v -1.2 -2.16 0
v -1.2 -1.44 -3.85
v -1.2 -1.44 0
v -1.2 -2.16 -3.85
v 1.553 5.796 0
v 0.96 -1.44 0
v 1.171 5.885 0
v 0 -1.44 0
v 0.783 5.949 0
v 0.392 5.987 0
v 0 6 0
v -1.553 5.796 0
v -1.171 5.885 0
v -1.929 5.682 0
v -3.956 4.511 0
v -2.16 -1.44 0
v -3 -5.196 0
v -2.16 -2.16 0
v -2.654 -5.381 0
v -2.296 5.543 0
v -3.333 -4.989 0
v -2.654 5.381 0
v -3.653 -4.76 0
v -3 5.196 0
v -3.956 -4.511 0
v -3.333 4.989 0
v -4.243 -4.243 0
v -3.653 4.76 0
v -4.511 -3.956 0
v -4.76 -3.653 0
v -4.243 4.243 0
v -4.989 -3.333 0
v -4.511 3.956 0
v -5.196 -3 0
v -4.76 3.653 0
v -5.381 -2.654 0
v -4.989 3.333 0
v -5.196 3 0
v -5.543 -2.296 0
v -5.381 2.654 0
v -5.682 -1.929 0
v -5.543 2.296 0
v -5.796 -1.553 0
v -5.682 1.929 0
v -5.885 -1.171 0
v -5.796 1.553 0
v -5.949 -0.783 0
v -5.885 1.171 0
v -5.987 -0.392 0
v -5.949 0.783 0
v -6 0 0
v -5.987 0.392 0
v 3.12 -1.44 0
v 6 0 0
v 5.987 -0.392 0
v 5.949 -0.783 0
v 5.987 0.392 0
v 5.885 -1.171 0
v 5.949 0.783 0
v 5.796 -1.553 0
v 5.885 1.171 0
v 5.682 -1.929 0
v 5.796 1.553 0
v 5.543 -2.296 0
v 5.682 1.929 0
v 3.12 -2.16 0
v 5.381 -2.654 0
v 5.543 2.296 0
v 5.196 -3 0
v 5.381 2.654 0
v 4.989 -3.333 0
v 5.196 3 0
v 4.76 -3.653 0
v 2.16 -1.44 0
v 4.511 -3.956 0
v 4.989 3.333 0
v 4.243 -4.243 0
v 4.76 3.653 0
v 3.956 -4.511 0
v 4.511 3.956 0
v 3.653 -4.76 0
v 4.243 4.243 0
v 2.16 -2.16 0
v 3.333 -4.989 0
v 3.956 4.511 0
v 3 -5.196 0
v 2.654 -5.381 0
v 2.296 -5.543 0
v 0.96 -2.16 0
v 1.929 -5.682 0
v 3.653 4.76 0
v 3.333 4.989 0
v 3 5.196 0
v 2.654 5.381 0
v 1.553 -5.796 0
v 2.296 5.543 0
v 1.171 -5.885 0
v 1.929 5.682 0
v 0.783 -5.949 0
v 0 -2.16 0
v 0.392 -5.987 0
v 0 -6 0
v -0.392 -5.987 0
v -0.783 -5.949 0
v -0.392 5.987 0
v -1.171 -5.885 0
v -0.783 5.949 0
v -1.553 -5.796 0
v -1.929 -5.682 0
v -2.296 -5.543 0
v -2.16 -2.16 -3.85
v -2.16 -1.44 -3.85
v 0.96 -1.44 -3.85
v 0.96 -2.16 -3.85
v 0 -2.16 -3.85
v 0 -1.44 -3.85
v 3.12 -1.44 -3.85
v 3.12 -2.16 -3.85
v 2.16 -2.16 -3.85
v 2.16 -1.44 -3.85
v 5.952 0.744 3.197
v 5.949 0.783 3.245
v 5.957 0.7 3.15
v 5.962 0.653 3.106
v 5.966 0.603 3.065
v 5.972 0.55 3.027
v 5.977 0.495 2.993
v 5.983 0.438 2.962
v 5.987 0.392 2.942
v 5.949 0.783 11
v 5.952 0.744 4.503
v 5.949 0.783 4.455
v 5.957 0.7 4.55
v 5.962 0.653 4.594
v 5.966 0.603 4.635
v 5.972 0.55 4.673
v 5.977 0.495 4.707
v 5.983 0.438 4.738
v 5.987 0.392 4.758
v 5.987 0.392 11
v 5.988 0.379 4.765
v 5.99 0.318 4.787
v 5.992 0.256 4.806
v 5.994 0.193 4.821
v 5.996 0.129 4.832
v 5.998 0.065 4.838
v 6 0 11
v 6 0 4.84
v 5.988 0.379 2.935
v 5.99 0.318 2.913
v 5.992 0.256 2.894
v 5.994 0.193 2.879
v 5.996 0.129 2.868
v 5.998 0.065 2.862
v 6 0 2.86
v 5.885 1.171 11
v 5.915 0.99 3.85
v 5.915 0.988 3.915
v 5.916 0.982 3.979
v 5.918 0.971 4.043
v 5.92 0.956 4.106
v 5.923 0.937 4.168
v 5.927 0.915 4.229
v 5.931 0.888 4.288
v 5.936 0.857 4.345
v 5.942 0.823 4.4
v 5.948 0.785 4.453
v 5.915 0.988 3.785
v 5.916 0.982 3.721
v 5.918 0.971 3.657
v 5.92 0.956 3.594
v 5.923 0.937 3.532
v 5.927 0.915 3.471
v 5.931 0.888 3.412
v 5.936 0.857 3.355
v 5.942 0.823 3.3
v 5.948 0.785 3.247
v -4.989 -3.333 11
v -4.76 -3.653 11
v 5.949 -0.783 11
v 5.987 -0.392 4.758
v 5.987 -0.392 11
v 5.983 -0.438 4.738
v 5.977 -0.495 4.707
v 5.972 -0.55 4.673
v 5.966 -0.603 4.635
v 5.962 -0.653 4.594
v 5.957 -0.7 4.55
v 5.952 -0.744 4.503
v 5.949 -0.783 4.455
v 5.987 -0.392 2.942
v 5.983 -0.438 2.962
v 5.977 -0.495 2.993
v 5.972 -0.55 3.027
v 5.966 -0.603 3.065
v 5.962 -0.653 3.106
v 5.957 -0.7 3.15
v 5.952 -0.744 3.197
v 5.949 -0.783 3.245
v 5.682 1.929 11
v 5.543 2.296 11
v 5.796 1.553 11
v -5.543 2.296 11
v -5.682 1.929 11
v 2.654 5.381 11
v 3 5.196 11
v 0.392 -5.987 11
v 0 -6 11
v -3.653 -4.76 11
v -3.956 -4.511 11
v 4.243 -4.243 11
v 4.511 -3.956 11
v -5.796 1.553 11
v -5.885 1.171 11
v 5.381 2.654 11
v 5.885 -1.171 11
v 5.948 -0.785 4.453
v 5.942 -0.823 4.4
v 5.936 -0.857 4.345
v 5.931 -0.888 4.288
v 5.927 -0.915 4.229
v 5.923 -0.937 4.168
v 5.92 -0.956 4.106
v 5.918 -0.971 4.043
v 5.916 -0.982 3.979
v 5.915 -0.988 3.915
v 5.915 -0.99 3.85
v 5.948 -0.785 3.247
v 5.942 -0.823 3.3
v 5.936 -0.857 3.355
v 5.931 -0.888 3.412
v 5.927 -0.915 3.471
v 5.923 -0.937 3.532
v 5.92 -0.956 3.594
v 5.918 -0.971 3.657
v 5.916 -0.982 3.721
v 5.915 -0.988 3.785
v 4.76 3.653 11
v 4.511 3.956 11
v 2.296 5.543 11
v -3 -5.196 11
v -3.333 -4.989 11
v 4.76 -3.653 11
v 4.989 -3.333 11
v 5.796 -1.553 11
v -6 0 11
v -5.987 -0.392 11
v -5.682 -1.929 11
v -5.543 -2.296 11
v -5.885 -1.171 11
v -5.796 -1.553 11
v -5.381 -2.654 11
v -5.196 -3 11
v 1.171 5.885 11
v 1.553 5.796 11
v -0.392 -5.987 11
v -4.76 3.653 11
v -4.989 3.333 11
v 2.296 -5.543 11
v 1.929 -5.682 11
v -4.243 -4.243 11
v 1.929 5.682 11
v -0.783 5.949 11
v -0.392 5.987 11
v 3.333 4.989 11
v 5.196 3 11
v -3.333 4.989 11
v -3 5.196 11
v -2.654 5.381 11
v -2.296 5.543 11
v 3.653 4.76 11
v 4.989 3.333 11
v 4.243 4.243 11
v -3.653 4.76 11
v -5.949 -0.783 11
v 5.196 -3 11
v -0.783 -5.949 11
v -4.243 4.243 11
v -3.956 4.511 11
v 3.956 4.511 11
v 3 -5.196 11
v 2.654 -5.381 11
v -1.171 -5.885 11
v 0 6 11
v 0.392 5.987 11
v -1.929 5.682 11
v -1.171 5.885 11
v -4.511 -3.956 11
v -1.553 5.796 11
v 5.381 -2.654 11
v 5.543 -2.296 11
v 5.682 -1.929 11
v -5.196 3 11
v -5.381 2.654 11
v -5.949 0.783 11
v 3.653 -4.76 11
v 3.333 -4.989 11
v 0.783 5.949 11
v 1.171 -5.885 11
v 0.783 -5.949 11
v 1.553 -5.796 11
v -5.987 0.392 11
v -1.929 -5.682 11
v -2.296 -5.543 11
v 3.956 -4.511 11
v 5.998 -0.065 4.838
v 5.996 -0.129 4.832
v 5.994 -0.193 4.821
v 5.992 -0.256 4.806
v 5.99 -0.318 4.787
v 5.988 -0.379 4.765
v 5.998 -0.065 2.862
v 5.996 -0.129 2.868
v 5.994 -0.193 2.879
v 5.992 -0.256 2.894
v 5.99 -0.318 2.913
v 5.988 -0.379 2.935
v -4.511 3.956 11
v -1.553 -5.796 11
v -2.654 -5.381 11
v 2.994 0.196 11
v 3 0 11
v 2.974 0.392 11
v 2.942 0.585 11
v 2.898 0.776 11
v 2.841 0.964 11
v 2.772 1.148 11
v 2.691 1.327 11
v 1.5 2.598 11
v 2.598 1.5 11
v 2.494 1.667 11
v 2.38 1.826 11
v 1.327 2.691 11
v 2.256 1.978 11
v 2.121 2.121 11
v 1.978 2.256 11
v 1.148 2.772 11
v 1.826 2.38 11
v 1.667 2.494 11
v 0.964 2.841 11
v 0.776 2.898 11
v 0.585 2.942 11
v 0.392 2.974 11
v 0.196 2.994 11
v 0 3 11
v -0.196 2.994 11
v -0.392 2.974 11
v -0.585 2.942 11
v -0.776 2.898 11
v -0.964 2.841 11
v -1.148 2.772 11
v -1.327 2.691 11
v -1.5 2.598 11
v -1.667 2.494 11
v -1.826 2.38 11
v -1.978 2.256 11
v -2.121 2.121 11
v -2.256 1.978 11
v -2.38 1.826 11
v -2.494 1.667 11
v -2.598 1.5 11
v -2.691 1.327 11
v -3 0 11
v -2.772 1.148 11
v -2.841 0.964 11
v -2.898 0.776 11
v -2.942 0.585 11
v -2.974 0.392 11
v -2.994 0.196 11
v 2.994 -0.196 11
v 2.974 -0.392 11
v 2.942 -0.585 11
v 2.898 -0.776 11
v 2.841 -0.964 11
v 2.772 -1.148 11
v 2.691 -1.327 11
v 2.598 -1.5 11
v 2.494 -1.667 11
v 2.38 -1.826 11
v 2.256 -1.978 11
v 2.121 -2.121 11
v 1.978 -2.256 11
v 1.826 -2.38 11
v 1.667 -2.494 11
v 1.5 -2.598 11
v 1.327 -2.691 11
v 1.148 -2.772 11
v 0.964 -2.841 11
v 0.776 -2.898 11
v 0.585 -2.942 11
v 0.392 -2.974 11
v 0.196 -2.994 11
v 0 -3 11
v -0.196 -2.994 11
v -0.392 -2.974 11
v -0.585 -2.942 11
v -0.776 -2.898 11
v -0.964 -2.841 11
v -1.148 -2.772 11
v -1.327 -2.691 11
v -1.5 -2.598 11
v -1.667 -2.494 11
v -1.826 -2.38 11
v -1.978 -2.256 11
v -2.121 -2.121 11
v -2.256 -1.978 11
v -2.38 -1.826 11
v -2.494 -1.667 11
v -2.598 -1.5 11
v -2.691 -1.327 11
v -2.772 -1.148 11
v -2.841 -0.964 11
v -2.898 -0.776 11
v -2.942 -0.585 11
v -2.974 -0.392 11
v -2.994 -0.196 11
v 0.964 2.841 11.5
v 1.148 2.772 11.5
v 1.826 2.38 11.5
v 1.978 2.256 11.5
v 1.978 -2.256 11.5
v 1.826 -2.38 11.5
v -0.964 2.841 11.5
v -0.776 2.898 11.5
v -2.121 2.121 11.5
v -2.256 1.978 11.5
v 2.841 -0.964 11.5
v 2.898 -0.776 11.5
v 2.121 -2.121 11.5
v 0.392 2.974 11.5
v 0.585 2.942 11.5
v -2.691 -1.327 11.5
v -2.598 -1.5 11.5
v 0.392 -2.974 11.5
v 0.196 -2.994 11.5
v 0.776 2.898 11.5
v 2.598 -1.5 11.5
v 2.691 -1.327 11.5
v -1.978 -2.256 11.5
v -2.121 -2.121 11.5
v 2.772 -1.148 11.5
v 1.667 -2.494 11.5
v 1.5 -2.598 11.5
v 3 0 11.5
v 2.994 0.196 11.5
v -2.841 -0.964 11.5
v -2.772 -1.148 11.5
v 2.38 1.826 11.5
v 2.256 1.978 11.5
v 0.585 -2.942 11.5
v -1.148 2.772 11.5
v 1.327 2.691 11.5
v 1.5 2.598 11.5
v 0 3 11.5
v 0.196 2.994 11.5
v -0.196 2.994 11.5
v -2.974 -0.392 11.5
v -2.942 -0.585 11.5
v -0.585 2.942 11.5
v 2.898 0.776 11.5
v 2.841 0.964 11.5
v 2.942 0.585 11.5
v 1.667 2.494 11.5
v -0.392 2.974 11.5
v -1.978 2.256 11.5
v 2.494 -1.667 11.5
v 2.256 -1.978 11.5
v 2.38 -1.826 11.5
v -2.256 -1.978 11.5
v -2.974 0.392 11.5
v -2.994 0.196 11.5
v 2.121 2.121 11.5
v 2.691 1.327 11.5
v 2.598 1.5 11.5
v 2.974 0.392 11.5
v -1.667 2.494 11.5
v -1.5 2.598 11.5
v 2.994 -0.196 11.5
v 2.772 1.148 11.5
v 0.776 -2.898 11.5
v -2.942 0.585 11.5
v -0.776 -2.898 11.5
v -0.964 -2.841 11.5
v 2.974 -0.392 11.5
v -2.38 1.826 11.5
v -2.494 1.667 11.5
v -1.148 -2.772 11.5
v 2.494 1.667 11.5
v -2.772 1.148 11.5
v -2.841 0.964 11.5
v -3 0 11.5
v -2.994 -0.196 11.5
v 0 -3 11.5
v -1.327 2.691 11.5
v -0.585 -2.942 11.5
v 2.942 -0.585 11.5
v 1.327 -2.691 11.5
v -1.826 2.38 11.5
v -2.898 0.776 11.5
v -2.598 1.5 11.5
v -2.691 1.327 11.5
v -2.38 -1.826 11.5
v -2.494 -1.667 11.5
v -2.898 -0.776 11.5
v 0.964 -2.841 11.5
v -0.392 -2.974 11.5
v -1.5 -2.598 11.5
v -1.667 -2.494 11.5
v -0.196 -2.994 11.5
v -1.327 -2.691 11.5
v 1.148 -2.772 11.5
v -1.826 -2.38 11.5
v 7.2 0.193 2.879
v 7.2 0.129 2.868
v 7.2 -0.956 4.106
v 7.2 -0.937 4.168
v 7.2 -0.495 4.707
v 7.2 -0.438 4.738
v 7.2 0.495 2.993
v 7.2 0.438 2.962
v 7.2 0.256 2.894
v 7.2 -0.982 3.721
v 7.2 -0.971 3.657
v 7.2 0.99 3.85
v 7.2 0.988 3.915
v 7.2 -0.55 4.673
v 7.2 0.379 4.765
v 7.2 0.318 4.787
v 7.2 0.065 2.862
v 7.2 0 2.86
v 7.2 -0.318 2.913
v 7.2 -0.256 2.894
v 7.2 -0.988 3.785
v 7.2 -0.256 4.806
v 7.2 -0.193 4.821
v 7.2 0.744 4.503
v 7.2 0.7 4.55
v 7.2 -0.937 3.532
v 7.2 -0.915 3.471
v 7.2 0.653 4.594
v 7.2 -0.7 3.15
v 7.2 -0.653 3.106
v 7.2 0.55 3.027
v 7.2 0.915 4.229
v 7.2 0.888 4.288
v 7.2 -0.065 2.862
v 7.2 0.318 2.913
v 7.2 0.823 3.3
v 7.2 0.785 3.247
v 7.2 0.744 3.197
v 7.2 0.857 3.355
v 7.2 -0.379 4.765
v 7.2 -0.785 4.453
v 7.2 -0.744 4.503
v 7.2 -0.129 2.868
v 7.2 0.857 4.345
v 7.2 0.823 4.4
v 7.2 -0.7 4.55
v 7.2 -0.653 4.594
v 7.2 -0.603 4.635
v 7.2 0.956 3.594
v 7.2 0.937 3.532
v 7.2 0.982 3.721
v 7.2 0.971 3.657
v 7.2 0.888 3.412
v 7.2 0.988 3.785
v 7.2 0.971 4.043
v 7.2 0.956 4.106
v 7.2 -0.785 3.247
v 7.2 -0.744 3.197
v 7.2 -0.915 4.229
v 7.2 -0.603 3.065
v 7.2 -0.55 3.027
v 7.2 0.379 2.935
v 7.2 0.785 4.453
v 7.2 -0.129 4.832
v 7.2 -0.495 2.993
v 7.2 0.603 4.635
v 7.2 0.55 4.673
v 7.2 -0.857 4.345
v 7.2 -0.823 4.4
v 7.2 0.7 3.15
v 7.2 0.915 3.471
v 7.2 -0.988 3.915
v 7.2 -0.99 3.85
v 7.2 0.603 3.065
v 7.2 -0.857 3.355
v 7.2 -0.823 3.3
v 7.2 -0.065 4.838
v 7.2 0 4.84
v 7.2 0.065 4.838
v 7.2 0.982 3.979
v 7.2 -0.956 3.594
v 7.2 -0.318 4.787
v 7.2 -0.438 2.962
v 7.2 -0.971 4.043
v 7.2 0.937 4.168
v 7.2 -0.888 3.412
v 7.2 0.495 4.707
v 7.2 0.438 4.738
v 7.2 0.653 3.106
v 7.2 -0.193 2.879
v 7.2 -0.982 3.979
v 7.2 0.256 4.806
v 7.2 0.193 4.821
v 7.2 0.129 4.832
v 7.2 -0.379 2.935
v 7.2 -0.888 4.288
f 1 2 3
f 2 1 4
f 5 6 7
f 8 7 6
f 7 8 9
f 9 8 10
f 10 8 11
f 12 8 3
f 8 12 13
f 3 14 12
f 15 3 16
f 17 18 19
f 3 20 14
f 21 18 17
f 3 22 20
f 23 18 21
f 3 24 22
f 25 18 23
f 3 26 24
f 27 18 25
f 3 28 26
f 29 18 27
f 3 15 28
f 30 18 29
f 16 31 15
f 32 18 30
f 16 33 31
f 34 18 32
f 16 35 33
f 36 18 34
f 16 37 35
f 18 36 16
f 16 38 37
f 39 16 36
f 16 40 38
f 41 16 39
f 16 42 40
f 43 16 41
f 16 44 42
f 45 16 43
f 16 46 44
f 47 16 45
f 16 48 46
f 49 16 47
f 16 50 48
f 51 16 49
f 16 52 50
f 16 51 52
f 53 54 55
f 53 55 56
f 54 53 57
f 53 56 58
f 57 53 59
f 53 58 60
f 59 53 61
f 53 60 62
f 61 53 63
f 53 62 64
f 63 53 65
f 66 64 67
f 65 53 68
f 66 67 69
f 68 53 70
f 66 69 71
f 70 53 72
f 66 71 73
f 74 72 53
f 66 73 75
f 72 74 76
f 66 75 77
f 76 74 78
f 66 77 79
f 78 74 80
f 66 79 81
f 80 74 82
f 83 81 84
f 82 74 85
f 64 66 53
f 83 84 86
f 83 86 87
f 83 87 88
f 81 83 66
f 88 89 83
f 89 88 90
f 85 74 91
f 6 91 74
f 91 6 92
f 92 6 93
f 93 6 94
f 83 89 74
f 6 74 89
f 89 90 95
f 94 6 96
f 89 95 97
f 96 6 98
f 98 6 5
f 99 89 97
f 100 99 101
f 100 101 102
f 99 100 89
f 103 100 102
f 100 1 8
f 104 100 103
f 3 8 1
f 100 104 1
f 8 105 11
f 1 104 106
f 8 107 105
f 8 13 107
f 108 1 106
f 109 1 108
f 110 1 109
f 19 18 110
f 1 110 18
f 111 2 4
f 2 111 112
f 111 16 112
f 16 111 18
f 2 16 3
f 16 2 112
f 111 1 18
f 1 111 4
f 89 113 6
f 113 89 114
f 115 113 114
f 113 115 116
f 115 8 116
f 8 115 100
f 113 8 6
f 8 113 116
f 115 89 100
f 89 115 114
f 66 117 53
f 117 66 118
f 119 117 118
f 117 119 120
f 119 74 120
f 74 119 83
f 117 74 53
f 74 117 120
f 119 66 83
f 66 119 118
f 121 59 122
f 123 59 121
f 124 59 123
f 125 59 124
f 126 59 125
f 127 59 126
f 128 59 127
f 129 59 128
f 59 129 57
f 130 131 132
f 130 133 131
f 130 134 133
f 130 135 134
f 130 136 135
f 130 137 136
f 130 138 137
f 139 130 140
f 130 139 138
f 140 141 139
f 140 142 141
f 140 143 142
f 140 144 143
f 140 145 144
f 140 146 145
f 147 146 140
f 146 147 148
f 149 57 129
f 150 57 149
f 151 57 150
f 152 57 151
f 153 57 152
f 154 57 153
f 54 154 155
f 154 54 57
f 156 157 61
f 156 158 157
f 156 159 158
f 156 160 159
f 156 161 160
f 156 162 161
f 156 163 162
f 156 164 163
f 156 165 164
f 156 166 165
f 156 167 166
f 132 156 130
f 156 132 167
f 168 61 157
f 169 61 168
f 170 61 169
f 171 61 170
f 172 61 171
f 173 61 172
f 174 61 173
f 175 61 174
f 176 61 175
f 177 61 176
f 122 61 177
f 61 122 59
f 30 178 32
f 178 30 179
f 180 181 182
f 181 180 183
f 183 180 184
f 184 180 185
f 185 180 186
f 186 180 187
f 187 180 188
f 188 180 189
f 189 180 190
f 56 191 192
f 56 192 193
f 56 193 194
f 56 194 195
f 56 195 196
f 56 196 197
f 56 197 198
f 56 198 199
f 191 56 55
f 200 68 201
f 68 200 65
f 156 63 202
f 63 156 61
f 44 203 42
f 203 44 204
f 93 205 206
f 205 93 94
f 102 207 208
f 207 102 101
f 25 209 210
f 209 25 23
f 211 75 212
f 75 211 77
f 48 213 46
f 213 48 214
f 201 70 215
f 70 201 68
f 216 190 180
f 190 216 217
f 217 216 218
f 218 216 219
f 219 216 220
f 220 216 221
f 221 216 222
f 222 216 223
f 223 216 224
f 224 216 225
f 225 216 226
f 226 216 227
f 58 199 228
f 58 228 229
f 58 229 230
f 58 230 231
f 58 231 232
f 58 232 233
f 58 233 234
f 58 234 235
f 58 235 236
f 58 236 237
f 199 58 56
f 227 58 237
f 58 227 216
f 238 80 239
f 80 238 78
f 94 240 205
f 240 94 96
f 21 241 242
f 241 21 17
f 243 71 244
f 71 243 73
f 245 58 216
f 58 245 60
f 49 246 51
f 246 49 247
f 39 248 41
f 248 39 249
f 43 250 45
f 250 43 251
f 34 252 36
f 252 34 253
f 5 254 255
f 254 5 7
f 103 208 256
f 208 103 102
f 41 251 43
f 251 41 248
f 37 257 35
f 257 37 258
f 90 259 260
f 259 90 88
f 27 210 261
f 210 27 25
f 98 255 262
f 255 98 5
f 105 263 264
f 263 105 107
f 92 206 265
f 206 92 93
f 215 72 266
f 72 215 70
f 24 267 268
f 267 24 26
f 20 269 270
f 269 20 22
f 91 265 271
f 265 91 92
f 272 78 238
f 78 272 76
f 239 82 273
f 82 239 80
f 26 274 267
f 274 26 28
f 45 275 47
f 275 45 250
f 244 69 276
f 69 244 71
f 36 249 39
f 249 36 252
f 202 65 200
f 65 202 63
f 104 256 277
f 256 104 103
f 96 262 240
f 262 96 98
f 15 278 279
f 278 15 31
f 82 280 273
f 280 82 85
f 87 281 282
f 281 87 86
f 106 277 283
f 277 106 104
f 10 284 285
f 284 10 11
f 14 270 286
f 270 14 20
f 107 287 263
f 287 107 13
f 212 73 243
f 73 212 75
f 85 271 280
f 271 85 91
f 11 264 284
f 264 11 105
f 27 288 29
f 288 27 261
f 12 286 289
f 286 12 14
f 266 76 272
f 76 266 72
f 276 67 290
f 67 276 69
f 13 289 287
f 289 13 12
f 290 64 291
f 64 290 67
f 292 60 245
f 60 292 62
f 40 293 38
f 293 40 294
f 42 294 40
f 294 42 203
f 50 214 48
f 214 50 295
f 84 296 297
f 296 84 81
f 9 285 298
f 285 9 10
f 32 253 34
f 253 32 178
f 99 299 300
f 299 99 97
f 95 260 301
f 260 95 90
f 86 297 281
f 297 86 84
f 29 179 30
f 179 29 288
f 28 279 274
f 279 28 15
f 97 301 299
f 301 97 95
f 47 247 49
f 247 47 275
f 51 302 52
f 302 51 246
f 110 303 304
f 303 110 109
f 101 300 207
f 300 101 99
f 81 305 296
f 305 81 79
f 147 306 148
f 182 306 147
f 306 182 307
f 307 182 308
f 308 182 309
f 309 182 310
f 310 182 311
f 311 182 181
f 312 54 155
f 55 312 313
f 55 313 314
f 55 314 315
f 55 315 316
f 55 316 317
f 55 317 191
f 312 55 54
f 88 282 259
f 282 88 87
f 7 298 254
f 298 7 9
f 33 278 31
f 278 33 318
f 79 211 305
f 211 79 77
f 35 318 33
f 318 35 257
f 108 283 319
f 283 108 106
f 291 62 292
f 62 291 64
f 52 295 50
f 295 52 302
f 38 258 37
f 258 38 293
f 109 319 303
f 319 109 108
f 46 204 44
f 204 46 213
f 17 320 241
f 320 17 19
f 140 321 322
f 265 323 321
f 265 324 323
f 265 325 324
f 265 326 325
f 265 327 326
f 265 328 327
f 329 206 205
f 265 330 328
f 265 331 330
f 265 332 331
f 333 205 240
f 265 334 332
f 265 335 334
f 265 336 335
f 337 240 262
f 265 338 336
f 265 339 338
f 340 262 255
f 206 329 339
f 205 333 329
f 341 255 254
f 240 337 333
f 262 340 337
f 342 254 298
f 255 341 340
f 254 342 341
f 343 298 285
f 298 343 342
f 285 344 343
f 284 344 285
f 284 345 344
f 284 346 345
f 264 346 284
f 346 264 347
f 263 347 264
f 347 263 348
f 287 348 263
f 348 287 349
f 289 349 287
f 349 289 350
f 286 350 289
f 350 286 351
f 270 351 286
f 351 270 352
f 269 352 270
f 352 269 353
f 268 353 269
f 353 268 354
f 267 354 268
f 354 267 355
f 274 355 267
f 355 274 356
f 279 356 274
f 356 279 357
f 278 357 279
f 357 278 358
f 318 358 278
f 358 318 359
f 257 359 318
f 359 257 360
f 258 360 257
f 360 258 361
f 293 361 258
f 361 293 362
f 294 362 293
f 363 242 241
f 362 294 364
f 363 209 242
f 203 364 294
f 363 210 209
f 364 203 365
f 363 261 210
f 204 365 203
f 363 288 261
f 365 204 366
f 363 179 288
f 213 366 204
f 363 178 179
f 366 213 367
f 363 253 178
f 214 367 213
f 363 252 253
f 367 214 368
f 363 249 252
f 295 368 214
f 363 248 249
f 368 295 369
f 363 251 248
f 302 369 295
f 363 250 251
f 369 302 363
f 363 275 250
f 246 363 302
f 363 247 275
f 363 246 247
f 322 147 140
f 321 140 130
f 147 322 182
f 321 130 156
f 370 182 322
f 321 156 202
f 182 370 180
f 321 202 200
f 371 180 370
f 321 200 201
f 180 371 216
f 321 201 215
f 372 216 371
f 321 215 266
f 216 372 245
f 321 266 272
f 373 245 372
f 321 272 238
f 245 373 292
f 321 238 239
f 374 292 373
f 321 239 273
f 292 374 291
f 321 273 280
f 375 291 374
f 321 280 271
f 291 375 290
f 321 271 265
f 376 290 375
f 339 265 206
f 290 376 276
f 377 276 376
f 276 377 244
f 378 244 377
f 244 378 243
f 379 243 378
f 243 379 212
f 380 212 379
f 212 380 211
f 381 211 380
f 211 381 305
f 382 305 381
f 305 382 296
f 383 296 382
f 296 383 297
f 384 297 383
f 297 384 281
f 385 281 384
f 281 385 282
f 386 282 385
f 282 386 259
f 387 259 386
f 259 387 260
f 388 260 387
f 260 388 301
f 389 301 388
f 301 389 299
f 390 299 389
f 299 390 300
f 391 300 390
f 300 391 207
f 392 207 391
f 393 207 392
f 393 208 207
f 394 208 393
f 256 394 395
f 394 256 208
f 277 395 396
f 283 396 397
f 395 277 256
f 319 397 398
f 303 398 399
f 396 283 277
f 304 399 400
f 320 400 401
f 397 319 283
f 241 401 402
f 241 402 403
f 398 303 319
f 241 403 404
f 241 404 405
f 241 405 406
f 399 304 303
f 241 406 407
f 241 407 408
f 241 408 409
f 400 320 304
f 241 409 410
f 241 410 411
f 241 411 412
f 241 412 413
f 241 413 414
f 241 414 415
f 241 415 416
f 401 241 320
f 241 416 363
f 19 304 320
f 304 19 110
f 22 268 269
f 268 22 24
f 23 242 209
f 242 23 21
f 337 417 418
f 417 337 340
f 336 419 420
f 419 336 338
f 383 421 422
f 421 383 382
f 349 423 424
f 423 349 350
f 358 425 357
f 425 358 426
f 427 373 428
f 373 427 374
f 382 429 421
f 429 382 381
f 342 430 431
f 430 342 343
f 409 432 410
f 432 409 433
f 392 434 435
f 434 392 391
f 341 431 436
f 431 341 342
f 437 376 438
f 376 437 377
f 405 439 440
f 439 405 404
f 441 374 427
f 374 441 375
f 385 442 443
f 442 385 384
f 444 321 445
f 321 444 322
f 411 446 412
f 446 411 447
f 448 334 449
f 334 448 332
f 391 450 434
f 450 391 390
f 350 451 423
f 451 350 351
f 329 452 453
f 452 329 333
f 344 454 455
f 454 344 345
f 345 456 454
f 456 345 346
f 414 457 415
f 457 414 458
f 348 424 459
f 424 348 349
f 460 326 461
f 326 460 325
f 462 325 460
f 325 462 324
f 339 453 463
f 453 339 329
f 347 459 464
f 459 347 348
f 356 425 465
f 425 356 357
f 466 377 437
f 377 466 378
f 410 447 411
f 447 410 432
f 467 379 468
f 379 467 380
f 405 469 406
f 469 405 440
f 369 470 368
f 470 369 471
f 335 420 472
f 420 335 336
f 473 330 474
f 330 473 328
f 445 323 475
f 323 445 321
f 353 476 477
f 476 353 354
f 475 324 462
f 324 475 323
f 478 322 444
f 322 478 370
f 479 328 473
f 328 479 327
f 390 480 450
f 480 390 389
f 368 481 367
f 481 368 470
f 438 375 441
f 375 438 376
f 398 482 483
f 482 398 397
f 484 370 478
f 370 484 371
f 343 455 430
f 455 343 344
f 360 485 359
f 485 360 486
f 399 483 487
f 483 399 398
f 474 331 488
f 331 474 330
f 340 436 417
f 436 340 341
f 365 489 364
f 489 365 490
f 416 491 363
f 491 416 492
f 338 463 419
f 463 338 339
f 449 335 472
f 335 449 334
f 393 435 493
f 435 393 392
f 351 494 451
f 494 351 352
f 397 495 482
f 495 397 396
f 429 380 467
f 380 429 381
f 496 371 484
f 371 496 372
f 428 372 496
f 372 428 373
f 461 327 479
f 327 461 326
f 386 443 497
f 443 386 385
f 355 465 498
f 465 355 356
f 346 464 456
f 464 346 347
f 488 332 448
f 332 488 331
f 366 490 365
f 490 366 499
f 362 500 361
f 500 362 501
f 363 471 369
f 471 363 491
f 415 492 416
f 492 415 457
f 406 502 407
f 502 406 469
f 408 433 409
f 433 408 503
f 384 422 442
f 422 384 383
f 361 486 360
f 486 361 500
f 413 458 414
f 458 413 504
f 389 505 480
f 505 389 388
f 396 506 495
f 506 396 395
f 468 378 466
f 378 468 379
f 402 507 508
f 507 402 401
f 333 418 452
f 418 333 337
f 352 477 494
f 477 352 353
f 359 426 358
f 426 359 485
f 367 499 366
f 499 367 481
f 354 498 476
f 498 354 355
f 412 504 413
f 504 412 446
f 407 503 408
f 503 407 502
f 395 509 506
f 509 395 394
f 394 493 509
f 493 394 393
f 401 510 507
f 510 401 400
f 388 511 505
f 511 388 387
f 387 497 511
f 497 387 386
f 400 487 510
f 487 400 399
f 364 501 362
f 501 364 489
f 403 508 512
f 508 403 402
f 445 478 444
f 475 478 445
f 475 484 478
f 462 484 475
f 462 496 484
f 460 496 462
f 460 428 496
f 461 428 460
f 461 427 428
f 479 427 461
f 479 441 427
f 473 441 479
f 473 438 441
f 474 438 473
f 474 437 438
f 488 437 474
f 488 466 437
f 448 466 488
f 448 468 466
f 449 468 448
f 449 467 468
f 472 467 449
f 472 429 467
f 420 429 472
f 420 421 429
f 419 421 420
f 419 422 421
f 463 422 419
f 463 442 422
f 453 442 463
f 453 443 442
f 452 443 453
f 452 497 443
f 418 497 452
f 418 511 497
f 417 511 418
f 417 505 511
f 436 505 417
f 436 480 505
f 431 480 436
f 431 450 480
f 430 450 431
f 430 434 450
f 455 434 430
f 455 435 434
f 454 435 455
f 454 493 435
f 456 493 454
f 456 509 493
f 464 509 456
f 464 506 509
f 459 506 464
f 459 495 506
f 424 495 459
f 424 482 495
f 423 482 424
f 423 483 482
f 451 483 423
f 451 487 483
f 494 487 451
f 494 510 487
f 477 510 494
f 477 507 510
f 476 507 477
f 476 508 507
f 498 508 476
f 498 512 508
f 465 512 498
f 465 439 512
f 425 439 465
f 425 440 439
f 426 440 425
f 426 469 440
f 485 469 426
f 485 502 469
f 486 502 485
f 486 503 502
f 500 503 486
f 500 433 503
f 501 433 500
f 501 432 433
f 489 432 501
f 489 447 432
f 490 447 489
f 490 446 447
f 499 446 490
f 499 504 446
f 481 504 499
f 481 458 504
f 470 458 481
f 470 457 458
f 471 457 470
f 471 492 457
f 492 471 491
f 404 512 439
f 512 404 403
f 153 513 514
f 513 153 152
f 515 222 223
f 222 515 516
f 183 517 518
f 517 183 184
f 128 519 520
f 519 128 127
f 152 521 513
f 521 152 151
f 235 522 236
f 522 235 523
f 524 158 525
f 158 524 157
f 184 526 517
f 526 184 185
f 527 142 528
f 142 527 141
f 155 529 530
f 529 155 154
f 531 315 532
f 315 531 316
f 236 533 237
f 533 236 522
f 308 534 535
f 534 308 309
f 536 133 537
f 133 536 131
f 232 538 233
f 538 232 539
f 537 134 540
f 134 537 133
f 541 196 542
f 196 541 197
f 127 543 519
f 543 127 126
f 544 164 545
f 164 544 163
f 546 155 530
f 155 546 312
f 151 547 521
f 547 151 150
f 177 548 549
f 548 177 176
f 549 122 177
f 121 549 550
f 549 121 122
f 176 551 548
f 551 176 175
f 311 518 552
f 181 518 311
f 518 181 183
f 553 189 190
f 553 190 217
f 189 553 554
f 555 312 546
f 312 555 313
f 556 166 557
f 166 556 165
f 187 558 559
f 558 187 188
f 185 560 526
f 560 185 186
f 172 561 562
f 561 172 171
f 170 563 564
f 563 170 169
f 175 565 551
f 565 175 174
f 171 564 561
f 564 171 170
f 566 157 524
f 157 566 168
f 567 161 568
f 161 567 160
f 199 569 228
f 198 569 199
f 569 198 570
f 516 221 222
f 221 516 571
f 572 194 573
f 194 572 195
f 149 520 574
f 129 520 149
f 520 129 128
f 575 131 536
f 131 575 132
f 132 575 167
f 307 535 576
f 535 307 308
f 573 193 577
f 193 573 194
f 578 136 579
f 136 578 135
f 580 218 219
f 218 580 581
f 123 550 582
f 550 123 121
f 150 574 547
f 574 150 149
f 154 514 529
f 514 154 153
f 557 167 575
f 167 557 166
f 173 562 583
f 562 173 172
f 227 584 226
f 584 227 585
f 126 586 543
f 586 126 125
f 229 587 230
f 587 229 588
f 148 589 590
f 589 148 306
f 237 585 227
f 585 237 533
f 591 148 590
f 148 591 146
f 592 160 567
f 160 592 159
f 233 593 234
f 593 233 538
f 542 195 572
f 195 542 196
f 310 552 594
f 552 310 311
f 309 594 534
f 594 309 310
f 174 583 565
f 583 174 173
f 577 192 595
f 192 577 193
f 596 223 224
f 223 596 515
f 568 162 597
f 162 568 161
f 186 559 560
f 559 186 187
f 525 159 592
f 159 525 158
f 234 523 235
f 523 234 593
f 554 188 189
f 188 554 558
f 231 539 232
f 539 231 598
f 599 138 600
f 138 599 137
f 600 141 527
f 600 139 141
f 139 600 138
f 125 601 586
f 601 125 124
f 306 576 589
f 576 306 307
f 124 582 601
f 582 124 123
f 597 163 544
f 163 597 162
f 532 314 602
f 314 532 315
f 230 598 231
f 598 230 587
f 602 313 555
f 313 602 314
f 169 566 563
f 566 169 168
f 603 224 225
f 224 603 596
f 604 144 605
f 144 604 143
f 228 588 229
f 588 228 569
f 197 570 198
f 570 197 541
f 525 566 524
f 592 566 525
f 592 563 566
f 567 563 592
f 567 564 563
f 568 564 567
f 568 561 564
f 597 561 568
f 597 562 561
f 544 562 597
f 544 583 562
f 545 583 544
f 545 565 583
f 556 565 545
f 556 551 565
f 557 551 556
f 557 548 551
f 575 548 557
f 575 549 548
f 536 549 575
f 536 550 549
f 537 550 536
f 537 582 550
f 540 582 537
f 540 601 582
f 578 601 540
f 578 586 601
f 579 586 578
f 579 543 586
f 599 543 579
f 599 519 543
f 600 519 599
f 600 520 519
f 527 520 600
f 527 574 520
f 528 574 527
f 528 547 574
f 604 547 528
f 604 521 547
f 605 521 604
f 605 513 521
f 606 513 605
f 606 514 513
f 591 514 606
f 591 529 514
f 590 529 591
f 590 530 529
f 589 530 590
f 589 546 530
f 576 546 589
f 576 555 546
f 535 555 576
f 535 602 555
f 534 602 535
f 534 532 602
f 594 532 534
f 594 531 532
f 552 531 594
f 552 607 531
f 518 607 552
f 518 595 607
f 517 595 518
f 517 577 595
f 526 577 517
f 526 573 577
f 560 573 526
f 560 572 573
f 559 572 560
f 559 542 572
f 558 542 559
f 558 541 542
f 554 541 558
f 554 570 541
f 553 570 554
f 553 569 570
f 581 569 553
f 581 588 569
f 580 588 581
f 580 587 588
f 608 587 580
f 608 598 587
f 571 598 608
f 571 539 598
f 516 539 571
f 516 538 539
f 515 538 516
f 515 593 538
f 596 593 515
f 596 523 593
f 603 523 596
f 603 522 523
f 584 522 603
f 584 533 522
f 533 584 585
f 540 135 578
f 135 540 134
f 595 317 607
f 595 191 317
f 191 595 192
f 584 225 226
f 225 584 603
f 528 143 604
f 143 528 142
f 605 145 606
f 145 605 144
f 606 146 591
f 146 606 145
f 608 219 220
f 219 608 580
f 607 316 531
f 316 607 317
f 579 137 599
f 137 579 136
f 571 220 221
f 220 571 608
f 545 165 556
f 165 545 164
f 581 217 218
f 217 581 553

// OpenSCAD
$fn = 96;

dims = [12, 11, 6, 0.5]; // [body_d, body_h, shaft_d, shaft_h]

body_d = dims[0];
body_h = dims[1];
shaft_d = dims[2];
shaft_h = dims[3];

module potentiometer(body_d=12, body_h=11, shaft_d=6, shaft_h=0.5) {
    union() {
        // Main cylindrical body
        cylinder(d=body_d, h=body_h);

        // Shaft on top
        translate([0,0,body_h])
            cylinder(d=shaft_d, h=shaft_h);

        // Small flat/tab to suggest orientation
        translate([body_d*0.35, 0, body_h*0.35])
            rotate([0,90,0])
                cylinder(d=body_h*0.18, h=body_d*0.25);

        // Three pins at bottom
        pin_w = body_d*0.08;
        pin_t = body_d*0.06;
        pin_h = body_h*0.35;
        pin_spacing = body_d*0.18;

        for (i = [-1,0,1]) {
            translate([i*pin_spacing, -body_d*0.18, -pin_h])
                cube([pin_w, pin_t, pin_h], center=false);
        }
    }
}

potentiometer(body_d, body_h, shaft_d, shaft_h);
